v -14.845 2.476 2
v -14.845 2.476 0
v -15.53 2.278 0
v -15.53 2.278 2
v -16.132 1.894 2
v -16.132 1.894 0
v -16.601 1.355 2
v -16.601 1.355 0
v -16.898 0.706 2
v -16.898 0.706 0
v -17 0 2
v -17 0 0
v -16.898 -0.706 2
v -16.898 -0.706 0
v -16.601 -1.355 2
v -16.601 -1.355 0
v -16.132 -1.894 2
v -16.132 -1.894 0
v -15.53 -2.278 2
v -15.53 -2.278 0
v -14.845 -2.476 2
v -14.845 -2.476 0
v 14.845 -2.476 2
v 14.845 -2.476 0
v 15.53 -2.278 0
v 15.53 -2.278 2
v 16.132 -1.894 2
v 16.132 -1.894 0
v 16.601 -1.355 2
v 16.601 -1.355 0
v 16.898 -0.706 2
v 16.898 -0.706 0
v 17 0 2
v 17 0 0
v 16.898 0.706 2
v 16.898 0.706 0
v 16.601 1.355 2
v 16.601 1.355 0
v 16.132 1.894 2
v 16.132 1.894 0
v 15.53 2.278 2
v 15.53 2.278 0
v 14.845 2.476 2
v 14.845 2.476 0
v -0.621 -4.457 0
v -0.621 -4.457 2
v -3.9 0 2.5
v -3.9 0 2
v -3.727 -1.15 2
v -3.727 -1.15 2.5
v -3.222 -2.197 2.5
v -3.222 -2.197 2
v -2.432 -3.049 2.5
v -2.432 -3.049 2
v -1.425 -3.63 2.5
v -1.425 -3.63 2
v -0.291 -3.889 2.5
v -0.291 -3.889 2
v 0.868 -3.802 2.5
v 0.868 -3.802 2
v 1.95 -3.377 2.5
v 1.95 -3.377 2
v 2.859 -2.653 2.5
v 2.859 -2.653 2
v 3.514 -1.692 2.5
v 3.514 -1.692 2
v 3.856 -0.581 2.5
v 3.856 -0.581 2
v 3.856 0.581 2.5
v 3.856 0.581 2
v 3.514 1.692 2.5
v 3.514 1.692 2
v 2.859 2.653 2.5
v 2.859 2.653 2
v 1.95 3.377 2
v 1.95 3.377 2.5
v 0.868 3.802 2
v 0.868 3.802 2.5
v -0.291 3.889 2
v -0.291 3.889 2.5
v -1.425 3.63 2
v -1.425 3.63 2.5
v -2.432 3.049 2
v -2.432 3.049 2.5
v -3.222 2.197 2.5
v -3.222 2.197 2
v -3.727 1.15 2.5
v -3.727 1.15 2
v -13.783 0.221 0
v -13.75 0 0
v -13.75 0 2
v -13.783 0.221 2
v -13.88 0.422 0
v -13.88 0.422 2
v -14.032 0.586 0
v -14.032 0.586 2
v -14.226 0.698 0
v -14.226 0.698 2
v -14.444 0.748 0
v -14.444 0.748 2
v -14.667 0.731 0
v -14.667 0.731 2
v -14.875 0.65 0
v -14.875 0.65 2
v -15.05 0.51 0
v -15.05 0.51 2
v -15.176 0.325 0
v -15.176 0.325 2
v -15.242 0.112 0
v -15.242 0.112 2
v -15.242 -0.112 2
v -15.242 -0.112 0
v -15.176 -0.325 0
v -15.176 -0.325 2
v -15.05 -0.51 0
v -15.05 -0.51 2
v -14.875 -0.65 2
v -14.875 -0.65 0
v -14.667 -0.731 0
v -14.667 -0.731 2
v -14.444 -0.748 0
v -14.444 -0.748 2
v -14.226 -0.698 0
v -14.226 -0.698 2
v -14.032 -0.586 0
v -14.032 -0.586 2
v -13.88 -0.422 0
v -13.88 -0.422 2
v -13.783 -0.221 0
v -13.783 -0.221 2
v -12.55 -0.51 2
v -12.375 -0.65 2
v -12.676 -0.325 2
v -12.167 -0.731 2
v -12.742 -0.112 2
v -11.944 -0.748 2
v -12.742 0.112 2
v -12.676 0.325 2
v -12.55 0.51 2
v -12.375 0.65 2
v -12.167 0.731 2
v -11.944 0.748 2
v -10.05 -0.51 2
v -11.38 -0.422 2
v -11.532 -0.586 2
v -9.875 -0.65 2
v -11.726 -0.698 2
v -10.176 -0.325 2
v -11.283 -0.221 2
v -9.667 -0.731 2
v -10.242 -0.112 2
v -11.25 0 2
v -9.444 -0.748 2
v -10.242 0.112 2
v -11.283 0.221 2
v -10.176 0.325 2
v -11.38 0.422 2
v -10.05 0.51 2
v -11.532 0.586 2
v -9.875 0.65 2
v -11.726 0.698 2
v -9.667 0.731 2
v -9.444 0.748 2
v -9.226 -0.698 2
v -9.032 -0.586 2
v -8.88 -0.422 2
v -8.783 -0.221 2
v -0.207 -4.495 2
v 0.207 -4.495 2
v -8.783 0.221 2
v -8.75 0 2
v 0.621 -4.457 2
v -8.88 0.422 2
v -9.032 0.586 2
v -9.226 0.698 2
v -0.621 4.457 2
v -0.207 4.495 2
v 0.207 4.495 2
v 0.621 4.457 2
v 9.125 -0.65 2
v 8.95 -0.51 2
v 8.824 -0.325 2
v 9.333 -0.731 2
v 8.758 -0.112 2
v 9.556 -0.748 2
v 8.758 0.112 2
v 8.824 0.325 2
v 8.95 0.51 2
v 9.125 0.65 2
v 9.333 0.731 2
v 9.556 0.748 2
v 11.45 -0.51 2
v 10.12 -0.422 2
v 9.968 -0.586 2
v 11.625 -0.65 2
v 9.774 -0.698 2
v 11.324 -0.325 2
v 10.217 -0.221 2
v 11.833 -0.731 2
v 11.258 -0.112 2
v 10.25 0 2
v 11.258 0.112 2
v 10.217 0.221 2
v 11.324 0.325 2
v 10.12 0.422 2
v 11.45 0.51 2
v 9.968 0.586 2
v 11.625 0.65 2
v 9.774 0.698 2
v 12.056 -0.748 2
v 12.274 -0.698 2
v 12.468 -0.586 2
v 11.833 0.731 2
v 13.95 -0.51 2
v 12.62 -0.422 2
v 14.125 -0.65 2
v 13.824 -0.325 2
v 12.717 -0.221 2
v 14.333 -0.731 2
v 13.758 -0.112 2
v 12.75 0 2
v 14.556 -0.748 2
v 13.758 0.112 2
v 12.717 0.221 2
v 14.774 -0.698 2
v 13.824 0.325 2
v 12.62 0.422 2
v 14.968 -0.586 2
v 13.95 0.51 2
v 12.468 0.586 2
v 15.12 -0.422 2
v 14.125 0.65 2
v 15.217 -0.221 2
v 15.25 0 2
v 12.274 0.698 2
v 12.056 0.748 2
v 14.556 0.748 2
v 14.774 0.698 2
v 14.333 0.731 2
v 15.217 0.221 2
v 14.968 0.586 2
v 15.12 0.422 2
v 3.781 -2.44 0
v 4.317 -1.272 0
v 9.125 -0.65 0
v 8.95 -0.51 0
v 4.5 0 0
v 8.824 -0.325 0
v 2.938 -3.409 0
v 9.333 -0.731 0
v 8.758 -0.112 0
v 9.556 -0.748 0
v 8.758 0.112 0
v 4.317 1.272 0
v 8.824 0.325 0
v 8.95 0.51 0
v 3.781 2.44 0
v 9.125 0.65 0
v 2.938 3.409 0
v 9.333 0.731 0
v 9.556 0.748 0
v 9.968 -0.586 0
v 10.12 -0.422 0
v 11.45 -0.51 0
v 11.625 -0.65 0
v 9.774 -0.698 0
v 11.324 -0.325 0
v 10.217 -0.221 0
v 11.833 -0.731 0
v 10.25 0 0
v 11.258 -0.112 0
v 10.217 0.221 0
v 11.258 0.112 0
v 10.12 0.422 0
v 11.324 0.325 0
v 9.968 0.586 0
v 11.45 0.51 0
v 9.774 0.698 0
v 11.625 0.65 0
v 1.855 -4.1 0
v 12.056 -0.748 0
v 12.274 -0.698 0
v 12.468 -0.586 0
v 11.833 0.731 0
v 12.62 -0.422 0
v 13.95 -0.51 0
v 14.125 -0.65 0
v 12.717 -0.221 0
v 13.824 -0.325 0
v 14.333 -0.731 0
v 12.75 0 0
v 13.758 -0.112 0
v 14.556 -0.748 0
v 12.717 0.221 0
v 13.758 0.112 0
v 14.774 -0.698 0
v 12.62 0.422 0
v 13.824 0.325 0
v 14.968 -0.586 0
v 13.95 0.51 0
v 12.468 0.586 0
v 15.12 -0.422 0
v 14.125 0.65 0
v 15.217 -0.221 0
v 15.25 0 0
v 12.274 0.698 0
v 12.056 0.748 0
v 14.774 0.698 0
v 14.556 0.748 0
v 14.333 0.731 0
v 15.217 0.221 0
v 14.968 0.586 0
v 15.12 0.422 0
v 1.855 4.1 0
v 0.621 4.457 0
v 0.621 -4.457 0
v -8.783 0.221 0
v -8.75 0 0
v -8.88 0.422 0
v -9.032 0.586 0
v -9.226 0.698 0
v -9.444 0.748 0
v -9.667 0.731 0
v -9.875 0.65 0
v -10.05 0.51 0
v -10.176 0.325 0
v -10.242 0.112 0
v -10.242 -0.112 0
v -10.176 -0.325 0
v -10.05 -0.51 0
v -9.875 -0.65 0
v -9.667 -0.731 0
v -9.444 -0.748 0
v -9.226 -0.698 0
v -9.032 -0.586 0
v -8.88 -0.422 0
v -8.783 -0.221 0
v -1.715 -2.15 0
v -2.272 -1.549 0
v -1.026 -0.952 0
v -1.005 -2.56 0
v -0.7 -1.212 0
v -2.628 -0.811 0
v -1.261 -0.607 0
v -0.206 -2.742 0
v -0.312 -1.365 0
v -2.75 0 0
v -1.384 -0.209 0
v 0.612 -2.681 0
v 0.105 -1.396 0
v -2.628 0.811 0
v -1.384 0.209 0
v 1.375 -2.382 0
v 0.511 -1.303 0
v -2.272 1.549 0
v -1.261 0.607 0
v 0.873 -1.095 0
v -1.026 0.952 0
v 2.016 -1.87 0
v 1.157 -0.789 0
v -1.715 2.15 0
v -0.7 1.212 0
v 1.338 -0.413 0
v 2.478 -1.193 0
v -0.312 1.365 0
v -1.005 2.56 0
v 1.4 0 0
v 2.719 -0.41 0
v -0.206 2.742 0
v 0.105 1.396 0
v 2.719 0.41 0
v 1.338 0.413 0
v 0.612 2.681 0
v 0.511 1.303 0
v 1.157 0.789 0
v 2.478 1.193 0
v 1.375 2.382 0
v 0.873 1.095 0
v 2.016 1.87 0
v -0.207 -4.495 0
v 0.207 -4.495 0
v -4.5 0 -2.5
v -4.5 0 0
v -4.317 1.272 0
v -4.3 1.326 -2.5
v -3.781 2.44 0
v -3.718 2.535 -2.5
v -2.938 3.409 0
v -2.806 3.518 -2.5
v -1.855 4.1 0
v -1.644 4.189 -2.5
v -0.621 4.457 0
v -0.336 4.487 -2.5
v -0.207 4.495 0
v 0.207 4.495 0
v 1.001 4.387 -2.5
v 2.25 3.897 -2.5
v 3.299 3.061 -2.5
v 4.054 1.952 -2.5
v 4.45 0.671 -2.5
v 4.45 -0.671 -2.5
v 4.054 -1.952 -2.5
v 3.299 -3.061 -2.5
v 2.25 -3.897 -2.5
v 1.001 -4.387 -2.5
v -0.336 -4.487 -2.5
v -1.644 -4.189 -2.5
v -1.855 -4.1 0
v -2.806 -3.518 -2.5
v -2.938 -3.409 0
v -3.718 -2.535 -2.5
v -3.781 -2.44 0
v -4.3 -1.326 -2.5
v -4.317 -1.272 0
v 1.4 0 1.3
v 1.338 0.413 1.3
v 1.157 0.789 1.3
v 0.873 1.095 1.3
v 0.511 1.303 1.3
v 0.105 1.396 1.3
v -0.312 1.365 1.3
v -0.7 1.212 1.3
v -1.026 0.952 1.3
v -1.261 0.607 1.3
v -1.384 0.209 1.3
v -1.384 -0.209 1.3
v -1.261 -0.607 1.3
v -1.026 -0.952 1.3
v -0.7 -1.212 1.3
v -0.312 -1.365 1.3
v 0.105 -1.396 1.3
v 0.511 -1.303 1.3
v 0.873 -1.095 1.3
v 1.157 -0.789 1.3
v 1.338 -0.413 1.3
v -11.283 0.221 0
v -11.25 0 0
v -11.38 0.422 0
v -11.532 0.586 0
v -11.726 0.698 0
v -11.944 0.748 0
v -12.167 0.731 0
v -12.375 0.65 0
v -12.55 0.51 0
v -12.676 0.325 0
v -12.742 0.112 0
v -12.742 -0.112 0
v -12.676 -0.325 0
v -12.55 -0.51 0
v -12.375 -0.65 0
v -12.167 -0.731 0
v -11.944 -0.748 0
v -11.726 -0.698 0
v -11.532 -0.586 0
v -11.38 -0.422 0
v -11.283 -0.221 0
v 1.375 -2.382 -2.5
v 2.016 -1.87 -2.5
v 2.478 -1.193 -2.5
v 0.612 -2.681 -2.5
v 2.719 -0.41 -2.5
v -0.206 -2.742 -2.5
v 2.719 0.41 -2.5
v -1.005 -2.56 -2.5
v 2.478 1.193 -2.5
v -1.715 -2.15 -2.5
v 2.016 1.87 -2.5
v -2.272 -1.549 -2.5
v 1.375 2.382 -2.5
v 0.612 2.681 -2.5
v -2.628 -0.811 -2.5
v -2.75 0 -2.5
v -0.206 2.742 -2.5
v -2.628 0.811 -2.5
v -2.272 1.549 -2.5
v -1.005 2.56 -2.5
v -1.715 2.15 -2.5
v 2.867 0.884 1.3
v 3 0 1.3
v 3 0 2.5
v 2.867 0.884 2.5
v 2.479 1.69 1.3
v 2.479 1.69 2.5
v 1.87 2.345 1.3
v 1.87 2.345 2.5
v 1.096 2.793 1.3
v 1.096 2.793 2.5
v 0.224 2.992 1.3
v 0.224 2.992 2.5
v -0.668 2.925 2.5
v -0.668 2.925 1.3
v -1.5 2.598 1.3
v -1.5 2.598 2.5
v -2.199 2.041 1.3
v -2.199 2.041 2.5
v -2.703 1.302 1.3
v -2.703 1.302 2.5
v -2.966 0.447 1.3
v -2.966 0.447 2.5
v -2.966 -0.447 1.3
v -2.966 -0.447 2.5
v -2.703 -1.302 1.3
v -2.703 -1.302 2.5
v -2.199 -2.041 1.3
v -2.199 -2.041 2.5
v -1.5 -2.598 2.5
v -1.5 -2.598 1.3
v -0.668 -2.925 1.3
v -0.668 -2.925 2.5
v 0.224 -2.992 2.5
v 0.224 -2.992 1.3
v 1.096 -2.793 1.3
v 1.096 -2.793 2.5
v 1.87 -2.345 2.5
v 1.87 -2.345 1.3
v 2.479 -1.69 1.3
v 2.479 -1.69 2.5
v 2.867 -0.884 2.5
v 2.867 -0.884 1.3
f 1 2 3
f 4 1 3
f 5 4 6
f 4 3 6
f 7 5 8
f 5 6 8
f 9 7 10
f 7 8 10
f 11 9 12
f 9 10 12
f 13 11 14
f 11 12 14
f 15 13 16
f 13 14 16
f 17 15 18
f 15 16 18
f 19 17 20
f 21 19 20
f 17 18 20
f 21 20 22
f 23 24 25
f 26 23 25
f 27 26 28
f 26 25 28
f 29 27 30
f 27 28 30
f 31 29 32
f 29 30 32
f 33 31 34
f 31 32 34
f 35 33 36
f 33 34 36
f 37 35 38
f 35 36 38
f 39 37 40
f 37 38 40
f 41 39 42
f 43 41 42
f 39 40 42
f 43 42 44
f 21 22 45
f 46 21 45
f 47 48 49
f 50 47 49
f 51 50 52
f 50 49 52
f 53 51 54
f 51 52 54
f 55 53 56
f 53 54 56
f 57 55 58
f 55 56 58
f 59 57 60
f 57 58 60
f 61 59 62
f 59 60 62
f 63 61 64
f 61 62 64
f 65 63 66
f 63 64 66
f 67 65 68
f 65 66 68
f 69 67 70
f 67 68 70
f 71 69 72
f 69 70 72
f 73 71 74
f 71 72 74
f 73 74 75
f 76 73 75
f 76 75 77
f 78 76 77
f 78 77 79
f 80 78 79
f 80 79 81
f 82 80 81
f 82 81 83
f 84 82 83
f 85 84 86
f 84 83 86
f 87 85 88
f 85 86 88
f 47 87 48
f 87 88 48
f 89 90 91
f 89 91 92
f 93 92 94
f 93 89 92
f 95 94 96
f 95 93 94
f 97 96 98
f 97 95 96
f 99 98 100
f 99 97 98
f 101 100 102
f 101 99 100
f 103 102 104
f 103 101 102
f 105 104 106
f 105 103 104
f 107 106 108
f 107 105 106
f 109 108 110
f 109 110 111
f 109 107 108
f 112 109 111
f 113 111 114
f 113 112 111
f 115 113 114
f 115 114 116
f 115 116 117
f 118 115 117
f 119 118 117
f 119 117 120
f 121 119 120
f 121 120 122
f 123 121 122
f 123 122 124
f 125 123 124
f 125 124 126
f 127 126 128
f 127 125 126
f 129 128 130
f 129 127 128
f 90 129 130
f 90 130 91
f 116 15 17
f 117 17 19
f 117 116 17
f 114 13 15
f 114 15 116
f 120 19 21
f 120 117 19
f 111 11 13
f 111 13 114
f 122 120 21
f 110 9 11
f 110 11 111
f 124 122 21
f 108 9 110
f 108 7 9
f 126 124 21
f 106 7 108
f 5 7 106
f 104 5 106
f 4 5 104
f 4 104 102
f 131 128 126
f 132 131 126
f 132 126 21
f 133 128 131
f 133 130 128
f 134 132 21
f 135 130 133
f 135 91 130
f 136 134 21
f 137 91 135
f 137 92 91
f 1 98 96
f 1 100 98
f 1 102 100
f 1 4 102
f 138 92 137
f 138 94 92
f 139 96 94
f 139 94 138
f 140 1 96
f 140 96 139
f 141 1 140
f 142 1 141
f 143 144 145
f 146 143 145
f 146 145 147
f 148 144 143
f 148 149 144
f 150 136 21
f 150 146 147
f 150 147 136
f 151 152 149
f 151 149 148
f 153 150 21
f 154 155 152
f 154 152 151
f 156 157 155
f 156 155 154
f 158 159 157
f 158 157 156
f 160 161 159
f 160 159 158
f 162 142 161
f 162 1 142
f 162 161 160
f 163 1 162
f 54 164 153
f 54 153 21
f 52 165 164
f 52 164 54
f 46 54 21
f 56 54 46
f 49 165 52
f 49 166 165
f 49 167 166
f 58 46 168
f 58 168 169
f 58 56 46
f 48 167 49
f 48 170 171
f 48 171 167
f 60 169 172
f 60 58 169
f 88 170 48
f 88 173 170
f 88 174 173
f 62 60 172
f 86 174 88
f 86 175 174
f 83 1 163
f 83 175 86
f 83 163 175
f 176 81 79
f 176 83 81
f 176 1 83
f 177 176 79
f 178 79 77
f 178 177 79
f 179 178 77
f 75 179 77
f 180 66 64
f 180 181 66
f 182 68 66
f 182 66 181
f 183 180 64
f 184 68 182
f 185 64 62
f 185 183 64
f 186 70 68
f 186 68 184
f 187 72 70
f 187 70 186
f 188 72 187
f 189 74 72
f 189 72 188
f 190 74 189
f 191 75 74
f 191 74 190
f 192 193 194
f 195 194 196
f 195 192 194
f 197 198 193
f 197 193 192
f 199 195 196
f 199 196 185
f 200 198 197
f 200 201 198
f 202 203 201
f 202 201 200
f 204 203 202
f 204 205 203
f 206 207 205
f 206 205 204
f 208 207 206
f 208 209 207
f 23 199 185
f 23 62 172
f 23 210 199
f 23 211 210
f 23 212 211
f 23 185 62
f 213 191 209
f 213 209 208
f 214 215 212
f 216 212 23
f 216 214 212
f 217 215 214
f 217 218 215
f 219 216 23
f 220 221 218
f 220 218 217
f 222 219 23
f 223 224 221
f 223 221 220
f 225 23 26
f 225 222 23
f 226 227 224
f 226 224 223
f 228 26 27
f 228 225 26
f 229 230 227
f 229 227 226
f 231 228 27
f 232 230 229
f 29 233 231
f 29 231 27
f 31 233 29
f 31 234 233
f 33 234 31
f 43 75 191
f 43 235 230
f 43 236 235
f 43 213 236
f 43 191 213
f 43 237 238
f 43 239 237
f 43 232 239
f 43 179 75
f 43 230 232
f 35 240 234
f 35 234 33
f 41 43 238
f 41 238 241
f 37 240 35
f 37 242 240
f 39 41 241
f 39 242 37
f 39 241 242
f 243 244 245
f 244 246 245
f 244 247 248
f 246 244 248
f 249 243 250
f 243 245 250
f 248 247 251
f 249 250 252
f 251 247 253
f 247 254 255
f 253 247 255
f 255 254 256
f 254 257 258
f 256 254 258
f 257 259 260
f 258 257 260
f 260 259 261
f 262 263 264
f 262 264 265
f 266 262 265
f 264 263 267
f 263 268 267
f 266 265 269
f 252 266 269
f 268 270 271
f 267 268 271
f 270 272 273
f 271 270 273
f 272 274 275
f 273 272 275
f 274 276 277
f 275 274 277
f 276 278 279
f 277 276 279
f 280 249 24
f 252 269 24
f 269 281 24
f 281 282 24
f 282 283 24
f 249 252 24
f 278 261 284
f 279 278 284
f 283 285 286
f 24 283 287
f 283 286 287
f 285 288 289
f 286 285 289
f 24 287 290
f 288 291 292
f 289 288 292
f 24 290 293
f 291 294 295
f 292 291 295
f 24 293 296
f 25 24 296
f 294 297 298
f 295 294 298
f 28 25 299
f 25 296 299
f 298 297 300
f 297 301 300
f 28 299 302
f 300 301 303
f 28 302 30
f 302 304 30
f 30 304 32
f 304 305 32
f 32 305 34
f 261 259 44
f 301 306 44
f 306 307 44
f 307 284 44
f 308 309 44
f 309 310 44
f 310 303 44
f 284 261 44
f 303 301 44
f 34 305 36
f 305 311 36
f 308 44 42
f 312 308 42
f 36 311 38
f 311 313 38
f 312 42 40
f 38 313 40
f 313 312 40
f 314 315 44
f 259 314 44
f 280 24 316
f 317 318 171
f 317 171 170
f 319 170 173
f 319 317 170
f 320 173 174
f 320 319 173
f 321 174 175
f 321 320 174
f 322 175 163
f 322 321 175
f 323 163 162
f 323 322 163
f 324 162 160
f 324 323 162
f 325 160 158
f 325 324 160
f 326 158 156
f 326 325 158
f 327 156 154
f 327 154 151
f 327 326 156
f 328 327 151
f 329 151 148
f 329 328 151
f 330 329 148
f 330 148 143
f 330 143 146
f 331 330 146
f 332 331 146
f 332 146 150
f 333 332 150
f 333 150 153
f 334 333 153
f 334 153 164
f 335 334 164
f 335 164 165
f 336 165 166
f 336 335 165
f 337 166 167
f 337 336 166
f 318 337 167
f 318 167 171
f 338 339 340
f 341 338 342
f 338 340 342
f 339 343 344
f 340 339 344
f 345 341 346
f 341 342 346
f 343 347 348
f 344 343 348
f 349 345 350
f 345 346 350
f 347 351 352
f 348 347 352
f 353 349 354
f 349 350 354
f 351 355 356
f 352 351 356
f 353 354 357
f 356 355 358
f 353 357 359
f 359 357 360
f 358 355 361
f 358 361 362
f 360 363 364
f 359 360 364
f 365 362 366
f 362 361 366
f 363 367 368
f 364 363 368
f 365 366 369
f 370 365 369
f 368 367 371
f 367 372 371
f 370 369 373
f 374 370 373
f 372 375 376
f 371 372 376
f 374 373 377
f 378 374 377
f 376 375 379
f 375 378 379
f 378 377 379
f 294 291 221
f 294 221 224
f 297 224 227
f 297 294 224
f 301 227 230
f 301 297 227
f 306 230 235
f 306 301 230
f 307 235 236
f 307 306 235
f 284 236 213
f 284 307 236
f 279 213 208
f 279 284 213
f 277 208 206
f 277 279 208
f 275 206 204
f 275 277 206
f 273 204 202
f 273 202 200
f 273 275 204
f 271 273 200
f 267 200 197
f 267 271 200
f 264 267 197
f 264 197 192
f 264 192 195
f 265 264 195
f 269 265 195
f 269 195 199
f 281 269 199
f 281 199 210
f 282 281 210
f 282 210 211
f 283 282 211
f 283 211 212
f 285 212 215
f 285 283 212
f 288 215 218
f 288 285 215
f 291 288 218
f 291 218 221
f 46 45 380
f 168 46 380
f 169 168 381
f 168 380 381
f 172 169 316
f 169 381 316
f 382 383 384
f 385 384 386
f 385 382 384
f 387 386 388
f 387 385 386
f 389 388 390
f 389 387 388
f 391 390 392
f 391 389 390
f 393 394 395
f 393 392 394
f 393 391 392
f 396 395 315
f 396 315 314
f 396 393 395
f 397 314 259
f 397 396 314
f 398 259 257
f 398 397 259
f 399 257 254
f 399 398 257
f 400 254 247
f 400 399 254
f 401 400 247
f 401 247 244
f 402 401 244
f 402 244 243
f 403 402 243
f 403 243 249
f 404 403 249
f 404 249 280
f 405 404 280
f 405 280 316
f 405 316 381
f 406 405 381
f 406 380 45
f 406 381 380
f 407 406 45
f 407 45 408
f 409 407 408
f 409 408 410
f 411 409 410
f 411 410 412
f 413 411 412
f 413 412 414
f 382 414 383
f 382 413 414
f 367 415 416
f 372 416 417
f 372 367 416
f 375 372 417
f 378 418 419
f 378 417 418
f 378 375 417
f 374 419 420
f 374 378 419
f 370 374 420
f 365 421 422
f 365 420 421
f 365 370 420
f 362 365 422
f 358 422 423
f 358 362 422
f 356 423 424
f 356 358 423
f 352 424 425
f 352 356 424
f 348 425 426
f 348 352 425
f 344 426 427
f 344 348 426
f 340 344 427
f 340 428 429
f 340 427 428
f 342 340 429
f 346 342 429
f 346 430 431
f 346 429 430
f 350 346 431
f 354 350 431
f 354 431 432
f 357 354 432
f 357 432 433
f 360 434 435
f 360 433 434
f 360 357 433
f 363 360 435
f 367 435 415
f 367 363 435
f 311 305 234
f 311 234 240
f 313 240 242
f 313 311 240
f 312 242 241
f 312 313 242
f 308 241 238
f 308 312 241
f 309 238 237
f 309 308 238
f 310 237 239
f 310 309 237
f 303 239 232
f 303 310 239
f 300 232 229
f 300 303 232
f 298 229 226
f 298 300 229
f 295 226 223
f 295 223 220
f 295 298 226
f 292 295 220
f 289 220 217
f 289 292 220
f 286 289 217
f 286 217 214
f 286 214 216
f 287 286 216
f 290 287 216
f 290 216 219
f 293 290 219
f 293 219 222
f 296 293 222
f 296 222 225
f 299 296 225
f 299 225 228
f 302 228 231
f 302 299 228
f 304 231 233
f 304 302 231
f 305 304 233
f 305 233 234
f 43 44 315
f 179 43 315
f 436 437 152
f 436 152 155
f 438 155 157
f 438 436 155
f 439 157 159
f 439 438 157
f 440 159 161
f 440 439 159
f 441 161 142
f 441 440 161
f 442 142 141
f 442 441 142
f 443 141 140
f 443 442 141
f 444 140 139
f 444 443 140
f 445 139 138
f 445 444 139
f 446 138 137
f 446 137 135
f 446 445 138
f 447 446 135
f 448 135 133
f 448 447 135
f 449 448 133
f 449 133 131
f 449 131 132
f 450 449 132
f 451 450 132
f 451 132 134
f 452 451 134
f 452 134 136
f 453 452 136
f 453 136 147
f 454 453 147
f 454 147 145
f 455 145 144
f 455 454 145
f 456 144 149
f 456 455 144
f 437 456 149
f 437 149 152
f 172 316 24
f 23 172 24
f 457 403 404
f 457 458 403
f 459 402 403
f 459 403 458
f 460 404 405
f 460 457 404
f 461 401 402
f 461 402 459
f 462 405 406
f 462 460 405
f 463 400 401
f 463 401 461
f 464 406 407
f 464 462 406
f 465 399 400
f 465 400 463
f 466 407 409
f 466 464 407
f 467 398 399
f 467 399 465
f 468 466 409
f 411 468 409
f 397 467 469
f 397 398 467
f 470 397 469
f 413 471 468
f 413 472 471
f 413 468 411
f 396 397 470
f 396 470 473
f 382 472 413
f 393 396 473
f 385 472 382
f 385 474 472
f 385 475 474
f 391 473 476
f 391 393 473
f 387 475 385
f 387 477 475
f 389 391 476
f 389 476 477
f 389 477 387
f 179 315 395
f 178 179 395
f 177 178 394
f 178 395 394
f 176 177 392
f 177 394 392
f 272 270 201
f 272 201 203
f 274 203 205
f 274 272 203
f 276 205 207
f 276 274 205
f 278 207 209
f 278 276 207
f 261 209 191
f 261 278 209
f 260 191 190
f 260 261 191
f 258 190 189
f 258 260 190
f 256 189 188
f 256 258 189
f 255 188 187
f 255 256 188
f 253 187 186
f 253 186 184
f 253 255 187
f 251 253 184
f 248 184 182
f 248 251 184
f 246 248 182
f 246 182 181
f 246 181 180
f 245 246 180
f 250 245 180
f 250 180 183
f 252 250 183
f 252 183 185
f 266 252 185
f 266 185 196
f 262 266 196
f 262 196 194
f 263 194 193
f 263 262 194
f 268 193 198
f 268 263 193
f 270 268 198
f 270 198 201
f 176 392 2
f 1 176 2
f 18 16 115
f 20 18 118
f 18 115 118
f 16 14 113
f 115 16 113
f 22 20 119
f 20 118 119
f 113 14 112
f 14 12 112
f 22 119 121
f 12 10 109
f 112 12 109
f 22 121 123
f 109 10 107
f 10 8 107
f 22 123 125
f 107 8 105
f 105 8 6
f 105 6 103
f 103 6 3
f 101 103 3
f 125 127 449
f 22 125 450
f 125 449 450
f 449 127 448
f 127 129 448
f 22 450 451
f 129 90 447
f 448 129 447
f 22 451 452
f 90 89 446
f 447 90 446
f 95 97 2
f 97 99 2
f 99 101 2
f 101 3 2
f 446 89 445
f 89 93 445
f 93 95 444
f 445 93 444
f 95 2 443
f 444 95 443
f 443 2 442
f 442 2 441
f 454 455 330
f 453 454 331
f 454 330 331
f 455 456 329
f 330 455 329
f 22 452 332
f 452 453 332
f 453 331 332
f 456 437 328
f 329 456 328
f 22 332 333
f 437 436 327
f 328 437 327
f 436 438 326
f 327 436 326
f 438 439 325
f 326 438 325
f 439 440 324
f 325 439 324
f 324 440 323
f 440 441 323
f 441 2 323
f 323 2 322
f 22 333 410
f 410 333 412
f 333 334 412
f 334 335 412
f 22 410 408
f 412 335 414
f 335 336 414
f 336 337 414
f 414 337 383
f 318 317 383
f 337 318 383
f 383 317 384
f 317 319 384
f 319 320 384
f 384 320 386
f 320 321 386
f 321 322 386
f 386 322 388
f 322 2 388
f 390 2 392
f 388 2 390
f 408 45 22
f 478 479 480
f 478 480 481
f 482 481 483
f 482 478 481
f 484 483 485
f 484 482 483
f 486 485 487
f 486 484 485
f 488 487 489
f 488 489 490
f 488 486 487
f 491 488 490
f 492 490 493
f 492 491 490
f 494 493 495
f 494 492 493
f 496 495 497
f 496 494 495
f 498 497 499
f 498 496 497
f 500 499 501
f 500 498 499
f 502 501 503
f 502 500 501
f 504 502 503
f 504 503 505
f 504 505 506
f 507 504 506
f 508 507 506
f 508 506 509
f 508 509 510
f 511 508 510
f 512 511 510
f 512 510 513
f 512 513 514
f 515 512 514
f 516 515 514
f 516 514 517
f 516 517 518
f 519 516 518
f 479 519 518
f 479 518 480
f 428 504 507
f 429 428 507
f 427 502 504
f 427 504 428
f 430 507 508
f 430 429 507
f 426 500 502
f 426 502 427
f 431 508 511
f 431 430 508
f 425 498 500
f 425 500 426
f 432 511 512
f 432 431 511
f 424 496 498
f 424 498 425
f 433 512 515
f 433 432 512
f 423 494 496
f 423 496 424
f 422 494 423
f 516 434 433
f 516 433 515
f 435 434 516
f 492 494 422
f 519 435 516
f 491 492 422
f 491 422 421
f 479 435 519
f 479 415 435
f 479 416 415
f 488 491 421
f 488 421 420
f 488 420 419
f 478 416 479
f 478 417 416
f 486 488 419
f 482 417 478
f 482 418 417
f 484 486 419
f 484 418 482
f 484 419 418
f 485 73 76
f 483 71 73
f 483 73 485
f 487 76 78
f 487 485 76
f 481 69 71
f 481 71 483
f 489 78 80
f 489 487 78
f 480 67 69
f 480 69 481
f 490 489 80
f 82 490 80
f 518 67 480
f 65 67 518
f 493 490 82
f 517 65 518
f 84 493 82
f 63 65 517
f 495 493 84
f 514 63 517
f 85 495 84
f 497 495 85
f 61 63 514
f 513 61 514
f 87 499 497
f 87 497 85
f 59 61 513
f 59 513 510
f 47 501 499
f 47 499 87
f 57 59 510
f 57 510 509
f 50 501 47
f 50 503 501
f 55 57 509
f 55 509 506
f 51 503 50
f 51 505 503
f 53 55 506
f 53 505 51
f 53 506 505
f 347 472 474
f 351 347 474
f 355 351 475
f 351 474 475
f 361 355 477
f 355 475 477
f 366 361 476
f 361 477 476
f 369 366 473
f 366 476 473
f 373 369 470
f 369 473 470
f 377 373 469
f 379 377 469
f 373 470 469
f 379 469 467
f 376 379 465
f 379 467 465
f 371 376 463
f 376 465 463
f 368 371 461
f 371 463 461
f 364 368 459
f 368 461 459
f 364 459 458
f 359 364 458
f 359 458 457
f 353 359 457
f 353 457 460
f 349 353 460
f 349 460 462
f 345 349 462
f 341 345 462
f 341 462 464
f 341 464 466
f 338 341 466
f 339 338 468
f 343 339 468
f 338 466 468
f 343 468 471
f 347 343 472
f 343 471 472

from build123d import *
from build123d.topology import SkipClean

# Parameters (mm, degrees)
ESQUISSE1_R             = 1.4
ESQUISSE1_R_2           = 0.75
BOSS_EXTRU_1_DEPTH      = 2
ESQUISSE2_R             = 3.9
ESQUISSE2_R_2           = 3
BOSS_EXTRU_2_DEPTH      = 0.5
ENL_V_START             = -1.2
ESQUISSE3_R             = 3
ENL_V_MAT_EXTRU_1_DEPTH = 1.2
BOSS_EXTRU_3_START      = 2.5
ESQUISSE4_R             = 4.5
ESQUISSE4_R_2           = 2.75
BOSS_EXTRU_3_DEPTH      = 2.5


with BuildPart() as part:
    # Esquisse1 → Boss.-Extru.1 (new body)
    with BuildSketch(Plane.XY):
        with BuildLine():
            Line((-0.620689655, 4.45698826), (-14.844827586, 2.476104589))
            ThreePointArc((-14.844827586, 2.476104589), (-17, 0), (-14.844827586, -2.476104589))
            Line((-14.844827586, -2.476104589), (-0.620689655, -4.45698826))
            ThreePointArc((-0.620689655, -4.45698826), (0, -4.5), (0.620689655, -4.45698826))
            Line((0.620689655, -4.45698826), (14.844827586, -2.476104589))
            ThreePointArc((14.844827586, -2.476104589), (17, 0), (14.844827586, 2.476104589))
            Line((14.844827586, 2.476104589), (0.620689655, 4.45698826))
            ThreePointArc((0.620689655, 4.45698826), (0, 4.5), (-0.620689655, 4.45698826))
        make_face()
        Circle(ESQUISSE1_R, mode=Mode.SUBTRACT)
        with Locations((14.5, 0)):
            Circle(ESQUISSE1_R_2, mode=Mode.SUBTRACT)
        with Locations((-14.5, 0)):
            Circle(ESQUISSE1_R_2, mode=Mode.SUBTRACT)
        with Locations((-12, 0)):
            Circle(ESQUISSE1_R_2, mode=Mode.SUBTRACT)
        with Locations((-9.5, 0)):
            Circle(ESQUISSE1_R_2, mode=Mode.SUBTRACT)
        with Locations((9.5, 0)):
            Circle(ESQUISSE1_R_2, mode=Mode.SUBTRACT)
        with Locations((12, 0)):
            Circle(ESQUISSE1_R_2, mode=Mode.SUBTRACT)
    extrude(amount=BOSS_EXTRU_1_DEPTH)

    # Esquisse2 → Boss.-Extru.2 (add)
    with BuildSketch(Plane.XY.offset(2)):
        with Locations(Location((0, 0, 0), (0, 0, 180))):
            Circle(ESQUISSE2_R)
        Circle(ESQUISSE2_R_2, mode=Mode.SUBTRACT)
    extrude(amount=BOSS_EXTRU_2_DEPTH)

    # Esquisse3 → Enlèv. mat.-Extru.1 (cut)
    with BuildSketch(Plane.XY.offset(2.5).offset(ENL_V_START)):
        Circle(ESQUISSE3_R)
    extrude(amount=ENL_V_MAT_EXTRU_1_DEPTH, mode=Mode.SUBTRACT)

    # Esquisse4 → Boss.-Extru.3 (add)
    with SkipClean():  # the faces are left unmerged after this step: merging them gives an invalid solid
        with BuildSketch(Plane(origin=(0, 0, 0), x_dir=(-1, 0, 0), z_dir=(0, 0, -1)).offset(BOSS_EXTRU_3_START)):
            Circle(ESQUISSE4_R)
            Circle(ESQUISSE4_R_2, mode=Mode.SUBTRACT)
        extrude(amount=-BOSS_EXTRU_3_DEPTH)


solid = part.part
